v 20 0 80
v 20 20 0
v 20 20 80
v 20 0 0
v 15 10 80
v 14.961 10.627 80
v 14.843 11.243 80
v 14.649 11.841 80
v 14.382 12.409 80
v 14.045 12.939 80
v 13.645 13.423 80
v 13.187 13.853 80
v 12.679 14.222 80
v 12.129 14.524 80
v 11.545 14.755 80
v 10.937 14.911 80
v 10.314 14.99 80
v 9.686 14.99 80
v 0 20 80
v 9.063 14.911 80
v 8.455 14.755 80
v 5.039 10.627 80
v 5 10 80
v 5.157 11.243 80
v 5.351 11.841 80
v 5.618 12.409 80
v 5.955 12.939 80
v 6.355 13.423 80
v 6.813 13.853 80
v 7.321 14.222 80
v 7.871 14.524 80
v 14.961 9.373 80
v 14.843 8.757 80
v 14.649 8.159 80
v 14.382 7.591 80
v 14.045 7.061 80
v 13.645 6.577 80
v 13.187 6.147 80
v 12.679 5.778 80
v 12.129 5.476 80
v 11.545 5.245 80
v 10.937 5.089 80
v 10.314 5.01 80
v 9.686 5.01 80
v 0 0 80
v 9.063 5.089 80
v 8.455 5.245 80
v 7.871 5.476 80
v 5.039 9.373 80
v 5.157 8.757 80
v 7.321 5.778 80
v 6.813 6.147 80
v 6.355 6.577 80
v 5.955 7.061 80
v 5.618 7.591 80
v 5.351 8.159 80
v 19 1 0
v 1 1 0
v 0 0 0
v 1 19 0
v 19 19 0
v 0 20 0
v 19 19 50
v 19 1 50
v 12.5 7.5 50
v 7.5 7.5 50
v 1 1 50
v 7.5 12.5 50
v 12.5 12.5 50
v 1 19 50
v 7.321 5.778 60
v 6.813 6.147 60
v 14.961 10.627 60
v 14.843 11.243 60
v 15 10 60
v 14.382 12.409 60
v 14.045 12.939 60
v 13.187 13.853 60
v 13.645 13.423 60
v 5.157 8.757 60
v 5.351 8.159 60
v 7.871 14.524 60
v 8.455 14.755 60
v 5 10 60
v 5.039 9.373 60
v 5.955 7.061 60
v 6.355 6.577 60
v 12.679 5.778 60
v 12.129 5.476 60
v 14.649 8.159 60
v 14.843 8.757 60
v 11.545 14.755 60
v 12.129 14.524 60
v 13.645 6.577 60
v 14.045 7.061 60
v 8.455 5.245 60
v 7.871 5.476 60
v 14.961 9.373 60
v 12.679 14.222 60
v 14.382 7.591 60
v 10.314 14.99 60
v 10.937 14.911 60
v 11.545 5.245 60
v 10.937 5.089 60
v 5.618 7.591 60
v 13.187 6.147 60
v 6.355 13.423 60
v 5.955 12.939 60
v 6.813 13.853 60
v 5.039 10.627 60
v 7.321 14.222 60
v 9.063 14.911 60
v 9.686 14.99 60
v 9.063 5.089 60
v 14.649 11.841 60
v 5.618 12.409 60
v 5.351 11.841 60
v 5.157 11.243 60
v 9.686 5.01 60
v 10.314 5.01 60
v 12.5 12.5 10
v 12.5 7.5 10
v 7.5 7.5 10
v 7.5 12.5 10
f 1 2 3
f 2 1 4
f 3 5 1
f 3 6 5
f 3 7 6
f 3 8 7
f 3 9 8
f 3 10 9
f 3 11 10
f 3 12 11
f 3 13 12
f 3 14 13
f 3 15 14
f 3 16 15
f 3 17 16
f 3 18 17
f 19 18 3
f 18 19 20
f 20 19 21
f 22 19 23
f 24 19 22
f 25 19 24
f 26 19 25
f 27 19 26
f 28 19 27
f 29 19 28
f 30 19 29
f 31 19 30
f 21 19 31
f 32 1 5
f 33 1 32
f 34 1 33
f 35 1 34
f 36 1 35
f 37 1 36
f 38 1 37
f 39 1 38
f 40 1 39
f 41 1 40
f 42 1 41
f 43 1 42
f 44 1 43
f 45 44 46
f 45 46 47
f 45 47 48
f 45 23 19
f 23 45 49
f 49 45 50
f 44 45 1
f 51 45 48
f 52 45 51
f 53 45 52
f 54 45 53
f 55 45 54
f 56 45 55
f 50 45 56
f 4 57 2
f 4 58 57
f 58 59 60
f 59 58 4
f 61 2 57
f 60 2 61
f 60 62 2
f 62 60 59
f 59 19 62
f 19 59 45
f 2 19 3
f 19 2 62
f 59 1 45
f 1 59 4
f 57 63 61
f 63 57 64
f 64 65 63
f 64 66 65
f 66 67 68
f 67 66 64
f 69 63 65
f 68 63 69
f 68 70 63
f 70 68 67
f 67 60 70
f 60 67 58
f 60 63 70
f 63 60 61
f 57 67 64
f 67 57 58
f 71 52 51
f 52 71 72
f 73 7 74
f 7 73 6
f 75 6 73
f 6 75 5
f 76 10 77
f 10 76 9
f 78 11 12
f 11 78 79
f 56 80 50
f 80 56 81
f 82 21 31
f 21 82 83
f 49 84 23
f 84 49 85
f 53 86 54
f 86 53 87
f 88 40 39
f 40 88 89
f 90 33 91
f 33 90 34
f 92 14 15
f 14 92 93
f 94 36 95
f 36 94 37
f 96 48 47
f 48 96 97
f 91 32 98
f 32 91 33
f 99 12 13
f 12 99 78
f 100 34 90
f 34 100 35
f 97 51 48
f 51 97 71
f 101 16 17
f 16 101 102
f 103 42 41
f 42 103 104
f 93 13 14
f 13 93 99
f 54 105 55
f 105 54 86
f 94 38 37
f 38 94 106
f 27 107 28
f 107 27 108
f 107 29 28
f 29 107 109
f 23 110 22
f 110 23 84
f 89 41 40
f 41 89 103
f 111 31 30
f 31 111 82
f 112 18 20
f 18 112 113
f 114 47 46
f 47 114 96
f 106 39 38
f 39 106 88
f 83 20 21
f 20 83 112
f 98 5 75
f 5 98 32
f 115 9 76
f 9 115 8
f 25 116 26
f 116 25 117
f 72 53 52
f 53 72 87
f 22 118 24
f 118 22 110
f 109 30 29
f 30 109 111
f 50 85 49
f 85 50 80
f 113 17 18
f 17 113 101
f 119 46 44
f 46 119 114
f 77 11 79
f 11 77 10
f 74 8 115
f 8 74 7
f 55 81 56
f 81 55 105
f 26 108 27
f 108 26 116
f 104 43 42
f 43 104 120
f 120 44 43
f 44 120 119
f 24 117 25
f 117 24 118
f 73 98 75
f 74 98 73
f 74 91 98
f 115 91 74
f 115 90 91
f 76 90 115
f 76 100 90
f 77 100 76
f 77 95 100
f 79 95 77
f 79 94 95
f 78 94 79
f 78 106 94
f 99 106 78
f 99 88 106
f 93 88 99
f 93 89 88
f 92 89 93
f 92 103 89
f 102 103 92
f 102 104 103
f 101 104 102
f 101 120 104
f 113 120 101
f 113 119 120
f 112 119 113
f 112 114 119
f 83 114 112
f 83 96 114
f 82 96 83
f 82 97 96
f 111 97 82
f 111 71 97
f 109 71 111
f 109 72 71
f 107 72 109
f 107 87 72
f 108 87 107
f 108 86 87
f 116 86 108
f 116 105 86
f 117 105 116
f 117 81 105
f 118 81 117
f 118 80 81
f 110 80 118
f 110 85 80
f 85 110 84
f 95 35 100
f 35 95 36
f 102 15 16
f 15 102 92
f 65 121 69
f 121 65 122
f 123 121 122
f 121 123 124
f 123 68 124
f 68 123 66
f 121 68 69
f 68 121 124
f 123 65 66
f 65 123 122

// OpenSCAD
// file: variables.scad
// Openscad variables
$fn=50;

// Personal variables
$backlash = 1;

$motorPipeWidth = 20;
$motorPipeWidthThickness = 1;
$motorPipeHeight = 80;
$motorPipeHeightThickness = 30;

$motorTreeHeight = 20;
$motorTreeRadius = 5;

$springTreeWidth = 5;
$springTreeHeightProportion = 0.8;
// main file
include <variables.scad>


union(){
    difference(){
        cube(size=[$motorPipeWidth, $motorPipeWidth, $motorPipeHeight]);
        translate([$motorPipeWidthThickness, $motorPipeWidthThickness, 0]){
            cube(
                size=[
                    $motorPipeWidth - 2 * $motorPipeWidthThickness,
                    $motorPipeWidth - 2 * $motorPipeWidthThickness,
                    $motorPipeHeight - $motorPipeHeightThickness
                ]
            );
        };
        translate([
            $motorPipeWidth / 2,
            $motorPipeWidth / 2,
            $motorPipeHeight - $motorTreeHeight
            ]){
                cylinder(h=$motorTreeHeight, r=$motorTreeRadius);
        };
    };

    translate([
        ($motorPipeWidth - $springTreeWidth) / 2,
        ($motorPipeWidth - $springTreeWidth) / 2,
        (1 - $springTreeHeightProportion) * ($motorPipeHeight - $motorPipeHeightThickness)
    ]){
        cube(
            size=[
                $springTreeWidth, $springTreeWidth,
                $springTreeHeightProportion * ($motorPipeHeight - $motorPipeHeightThickness)
            ]
        );
    };
};


// cylinder();
